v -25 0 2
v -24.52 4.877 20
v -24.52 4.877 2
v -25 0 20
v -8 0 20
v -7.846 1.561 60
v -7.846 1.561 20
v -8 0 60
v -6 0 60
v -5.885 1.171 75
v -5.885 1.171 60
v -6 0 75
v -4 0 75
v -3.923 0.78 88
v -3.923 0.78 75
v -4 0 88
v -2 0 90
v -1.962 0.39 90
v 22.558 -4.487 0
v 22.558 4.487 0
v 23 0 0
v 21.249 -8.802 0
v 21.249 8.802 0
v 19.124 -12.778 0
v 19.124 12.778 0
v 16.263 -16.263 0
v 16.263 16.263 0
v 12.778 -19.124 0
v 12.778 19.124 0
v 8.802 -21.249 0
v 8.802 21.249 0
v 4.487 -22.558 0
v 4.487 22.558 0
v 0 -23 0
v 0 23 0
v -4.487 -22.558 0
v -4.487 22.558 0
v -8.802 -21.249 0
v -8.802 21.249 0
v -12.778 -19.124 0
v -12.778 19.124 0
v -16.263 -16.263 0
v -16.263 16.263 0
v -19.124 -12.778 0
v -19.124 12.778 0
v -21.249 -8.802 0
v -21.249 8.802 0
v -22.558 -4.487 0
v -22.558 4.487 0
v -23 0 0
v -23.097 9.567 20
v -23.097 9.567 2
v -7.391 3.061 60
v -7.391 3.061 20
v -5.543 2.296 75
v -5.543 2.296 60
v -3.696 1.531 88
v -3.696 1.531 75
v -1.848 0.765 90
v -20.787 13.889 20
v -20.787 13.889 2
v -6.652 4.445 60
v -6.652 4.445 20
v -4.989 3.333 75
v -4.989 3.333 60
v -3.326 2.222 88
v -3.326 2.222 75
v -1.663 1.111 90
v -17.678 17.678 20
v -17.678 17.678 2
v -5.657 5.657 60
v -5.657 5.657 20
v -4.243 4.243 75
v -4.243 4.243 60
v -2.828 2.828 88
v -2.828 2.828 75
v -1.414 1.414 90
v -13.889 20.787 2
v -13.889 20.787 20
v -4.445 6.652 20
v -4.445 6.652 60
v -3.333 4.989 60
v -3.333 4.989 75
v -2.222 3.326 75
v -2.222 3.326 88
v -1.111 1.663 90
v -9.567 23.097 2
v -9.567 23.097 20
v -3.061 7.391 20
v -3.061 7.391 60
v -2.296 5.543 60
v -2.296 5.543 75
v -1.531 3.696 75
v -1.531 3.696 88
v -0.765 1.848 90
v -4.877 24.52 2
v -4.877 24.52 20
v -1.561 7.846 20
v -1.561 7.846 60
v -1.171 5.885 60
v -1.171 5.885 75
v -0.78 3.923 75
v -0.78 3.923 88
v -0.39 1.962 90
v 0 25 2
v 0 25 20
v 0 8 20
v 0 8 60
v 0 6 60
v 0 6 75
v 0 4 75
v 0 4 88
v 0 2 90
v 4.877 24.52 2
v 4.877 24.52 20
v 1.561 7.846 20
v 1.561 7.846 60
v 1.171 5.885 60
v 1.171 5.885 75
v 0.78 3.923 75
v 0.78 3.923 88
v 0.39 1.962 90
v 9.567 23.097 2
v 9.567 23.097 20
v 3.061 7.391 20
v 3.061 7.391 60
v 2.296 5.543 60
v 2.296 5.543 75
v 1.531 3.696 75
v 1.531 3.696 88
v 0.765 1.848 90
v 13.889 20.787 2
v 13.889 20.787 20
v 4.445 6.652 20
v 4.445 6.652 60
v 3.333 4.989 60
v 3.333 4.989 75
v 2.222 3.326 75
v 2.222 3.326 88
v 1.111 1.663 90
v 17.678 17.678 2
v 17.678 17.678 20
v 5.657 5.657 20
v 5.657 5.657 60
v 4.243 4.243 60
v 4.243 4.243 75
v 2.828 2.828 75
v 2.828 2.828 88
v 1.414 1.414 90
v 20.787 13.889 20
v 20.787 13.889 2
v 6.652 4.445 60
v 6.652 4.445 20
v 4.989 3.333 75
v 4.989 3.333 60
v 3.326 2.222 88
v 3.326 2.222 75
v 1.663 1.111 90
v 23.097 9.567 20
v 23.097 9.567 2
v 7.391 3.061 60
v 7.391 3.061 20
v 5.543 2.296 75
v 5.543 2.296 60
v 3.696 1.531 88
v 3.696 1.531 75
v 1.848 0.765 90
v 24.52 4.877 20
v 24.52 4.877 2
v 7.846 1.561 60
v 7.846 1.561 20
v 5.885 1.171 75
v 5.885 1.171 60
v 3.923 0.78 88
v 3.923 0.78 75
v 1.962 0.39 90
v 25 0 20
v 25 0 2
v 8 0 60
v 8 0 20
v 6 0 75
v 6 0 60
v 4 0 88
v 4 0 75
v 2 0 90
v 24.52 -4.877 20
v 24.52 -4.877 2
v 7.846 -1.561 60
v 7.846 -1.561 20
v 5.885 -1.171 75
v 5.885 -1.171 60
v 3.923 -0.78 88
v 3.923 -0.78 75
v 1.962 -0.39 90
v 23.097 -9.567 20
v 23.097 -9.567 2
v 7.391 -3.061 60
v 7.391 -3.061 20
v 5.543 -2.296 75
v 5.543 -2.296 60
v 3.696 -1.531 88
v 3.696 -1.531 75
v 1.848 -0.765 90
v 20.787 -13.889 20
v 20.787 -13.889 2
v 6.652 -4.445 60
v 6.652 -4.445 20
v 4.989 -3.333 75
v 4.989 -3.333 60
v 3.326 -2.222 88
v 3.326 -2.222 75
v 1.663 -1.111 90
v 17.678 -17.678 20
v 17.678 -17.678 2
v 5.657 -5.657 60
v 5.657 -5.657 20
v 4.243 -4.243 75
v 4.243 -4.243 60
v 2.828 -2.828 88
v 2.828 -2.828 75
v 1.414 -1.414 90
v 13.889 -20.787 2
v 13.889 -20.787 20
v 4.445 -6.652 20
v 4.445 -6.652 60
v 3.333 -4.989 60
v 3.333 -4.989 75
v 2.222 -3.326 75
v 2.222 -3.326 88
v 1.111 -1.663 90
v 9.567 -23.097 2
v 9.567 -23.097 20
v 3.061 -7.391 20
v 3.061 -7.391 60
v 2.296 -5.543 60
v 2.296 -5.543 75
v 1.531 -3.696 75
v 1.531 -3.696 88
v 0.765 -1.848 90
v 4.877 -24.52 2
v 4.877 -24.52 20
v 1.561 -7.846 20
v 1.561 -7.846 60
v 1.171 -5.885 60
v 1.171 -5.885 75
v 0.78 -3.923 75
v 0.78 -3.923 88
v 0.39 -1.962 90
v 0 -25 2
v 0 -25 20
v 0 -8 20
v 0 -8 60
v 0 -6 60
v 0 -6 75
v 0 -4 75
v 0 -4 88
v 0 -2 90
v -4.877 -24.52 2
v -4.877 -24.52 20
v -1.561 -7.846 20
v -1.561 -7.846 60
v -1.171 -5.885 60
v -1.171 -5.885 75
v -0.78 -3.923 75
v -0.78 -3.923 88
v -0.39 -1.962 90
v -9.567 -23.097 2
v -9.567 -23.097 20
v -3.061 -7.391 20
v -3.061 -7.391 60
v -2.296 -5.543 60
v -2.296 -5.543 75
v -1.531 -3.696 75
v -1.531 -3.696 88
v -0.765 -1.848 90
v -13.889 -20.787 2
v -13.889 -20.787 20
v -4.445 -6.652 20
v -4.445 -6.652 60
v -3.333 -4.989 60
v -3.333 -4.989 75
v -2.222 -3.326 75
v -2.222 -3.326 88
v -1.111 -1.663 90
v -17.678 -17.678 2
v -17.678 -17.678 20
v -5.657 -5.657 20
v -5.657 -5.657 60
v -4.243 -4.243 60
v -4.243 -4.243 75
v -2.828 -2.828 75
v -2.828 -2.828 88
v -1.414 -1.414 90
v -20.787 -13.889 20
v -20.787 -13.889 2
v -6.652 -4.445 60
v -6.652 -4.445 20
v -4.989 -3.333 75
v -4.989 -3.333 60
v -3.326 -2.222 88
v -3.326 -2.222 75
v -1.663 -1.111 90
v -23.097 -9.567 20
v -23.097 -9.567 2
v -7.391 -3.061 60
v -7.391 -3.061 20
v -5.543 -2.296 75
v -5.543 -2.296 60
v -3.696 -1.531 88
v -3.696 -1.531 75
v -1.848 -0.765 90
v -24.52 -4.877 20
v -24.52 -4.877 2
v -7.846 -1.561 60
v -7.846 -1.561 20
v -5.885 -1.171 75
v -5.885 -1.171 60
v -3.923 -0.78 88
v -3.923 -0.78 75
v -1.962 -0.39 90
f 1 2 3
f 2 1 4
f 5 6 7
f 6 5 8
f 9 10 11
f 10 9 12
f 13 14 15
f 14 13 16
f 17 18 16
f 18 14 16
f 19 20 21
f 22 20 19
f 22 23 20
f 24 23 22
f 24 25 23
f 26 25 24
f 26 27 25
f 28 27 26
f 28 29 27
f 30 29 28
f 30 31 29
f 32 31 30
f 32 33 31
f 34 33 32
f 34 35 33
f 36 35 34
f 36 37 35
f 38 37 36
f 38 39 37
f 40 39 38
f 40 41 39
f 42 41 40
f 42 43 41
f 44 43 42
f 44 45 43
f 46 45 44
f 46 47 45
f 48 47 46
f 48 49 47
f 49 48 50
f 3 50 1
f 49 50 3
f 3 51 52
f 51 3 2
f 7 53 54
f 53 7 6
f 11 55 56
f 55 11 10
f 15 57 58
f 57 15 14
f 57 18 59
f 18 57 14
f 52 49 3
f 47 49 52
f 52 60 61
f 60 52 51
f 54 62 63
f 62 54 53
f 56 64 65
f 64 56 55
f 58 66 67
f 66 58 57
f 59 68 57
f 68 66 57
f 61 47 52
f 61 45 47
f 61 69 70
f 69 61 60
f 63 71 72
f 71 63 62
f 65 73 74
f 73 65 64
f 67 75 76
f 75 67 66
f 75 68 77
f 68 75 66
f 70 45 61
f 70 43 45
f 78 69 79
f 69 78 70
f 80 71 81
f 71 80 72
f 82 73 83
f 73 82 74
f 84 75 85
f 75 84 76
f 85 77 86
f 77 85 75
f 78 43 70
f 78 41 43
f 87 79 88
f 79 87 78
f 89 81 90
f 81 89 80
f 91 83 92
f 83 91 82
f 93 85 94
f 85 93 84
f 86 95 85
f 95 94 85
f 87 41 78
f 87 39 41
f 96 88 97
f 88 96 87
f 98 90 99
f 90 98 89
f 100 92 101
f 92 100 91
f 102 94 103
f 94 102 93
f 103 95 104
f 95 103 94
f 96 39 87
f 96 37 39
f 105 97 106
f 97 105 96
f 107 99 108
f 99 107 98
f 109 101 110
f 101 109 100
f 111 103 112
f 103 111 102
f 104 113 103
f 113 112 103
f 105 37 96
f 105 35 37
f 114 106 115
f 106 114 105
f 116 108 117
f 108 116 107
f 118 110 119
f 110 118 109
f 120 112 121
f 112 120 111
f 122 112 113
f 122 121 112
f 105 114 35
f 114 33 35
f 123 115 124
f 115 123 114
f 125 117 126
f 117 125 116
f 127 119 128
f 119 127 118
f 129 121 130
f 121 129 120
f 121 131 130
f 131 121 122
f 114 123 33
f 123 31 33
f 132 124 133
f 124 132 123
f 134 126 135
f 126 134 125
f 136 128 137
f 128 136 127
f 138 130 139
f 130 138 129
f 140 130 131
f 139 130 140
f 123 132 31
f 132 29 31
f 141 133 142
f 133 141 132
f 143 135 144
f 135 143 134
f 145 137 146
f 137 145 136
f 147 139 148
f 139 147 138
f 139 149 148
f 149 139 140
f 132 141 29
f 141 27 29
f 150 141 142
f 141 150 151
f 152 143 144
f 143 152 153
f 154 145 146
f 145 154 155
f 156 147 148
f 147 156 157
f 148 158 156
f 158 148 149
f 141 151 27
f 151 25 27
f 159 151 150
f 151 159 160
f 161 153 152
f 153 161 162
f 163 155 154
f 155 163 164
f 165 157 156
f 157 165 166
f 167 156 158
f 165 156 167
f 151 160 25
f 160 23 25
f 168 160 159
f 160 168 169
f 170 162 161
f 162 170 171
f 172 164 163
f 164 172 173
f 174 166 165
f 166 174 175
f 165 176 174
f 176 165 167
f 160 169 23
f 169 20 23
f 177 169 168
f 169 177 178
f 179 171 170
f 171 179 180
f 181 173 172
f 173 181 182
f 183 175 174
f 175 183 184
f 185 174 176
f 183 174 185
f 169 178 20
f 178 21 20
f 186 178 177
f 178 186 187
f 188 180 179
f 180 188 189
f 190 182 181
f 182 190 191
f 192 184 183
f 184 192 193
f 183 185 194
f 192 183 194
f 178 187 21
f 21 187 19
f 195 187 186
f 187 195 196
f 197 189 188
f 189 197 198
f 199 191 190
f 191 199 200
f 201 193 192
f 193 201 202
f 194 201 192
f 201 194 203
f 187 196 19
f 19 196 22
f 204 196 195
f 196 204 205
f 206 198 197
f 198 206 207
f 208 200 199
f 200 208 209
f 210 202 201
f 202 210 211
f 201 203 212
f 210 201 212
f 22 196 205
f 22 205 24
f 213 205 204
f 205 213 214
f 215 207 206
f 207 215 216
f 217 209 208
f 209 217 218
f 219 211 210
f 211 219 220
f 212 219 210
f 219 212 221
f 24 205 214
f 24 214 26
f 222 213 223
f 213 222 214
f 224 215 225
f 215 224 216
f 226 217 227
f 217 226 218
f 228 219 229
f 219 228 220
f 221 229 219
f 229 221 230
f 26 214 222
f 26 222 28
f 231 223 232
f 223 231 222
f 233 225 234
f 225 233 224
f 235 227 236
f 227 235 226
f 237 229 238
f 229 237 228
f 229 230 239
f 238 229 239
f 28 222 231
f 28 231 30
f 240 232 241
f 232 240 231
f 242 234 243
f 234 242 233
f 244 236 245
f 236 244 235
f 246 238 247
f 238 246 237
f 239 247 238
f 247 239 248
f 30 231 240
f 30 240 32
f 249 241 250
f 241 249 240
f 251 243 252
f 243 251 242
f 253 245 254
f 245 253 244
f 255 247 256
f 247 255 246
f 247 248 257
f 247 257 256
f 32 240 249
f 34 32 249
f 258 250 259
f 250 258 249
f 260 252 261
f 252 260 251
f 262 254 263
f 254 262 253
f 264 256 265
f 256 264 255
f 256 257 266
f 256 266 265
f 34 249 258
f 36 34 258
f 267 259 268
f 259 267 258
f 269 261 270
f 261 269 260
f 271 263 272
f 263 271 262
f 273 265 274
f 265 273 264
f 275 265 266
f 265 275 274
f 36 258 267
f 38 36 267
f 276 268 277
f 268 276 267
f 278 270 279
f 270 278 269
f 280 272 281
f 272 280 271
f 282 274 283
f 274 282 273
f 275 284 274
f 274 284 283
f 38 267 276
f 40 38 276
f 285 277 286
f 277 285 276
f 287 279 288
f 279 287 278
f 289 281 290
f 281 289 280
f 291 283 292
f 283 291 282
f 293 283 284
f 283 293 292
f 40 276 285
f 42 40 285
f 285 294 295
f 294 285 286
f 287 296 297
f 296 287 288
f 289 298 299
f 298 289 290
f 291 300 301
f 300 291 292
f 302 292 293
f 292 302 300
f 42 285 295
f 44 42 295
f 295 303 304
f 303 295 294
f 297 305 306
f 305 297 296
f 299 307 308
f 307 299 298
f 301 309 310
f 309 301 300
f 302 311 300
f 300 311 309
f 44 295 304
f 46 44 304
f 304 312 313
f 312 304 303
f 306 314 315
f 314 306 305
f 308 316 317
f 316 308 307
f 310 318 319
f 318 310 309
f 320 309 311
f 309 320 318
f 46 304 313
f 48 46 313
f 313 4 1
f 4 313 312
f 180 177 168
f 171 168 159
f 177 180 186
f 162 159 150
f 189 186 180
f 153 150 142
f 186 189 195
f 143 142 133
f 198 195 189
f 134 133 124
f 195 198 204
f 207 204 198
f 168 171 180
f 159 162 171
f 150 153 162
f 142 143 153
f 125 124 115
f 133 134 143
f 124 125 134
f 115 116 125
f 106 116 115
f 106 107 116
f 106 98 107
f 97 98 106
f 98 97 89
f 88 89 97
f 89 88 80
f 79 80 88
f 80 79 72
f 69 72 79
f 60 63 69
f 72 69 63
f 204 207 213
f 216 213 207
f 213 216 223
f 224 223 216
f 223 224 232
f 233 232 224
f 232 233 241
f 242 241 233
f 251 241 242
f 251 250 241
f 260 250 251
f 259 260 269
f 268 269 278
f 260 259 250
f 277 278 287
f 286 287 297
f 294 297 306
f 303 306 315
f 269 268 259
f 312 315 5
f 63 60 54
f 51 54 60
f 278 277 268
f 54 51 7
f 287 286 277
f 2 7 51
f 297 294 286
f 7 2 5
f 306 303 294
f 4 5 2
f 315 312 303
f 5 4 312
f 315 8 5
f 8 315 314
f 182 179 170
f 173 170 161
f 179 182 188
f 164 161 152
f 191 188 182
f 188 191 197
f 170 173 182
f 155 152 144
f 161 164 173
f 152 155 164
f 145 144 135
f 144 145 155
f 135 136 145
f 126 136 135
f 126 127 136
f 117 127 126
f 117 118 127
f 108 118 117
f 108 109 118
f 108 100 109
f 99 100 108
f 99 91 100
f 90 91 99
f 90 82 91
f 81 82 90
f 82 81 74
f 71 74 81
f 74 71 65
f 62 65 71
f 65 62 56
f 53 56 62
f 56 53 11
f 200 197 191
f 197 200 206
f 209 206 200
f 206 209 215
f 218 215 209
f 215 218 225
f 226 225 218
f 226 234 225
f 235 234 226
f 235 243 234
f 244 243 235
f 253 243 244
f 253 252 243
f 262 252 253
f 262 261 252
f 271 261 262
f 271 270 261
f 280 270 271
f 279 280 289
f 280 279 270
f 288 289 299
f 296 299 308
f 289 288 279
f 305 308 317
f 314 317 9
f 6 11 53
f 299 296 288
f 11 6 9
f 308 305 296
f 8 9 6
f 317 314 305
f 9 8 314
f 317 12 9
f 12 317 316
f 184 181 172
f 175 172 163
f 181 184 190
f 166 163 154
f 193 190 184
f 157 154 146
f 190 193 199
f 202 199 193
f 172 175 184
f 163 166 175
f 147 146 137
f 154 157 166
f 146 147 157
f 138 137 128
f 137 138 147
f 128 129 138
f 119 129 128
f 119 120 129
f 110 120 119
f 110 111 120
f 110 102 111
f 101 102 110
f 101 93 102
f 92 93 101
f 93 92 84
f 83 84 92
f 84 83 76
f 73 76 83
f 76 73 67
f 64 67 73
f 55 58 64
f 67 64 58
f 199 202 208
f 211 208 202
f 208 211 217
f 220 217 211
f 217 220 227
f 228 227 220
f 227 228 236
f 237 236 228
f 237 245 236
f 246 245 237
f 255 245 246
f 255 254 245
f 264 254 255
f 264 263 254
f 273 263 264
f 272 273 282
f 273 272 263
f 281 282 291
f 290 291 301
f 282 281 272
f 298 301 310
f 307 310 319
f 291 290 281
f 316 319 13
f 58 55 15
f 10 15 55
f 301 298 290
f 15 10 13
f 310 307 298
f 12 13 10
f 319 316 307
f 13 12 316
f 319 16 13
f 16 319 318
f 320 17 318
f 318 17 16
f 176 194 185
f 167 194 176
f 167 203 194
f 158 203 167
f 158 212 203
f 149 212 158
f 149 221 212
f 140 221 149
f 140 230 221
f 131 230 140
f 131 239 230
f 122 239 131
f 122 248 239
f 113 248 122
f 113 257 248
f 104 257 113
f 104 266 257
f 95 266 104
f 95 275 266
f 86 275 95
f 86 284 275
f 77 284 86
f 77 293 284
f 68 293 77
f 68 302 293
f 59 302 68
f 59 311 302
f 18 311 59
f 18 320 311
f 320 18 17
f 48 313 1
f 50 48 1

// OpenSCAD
$fn = 32;

// ----------------------------------------------------------------------
// Stepped shaft: diameters 50, 16, 12, 8 mm, 90 mm long
// ----------------------------------------------------------------------

// --- parameters (mm) ---
d1 = 50;                  // step 1 diameter
len1 = 20;                // step 1 length
d2 = 16;                  // step 2 diameter
len2 = 40;                // step 2 length
d3 = 12;                  // step 3 diameter
len3 = 15;                // step 3 length
d4 = 8;                   // step 4 diameter
len4 = 15;                // step 4 length
total = 90;               // overall length
chamfer = 2;              // end chamfer
key_w = 6;                // keyway width
key_d = 3;                // keyway depth
key_len = 14;             // keyway length
key_z = 73;               // keyway start along the shaft

/* closed turning profile: x is the radius, y is the length */
profile = [[0, 0], [25 - chamfer, 0], [25, chamfer], [25, 20], [8, 20], [8, 60], [6, 60], [6, 75], [4, 75], [4, 88], [2, 90], [0, 90]];

difference() {
  rotate_extrude() polygon(profile);
  /* keyway milled into the top of the largest step */
  translate([d1 / 2 - key_d, -key_w / 2, key_z]) cube([key_d + 1, key_w, key_len]);
}
